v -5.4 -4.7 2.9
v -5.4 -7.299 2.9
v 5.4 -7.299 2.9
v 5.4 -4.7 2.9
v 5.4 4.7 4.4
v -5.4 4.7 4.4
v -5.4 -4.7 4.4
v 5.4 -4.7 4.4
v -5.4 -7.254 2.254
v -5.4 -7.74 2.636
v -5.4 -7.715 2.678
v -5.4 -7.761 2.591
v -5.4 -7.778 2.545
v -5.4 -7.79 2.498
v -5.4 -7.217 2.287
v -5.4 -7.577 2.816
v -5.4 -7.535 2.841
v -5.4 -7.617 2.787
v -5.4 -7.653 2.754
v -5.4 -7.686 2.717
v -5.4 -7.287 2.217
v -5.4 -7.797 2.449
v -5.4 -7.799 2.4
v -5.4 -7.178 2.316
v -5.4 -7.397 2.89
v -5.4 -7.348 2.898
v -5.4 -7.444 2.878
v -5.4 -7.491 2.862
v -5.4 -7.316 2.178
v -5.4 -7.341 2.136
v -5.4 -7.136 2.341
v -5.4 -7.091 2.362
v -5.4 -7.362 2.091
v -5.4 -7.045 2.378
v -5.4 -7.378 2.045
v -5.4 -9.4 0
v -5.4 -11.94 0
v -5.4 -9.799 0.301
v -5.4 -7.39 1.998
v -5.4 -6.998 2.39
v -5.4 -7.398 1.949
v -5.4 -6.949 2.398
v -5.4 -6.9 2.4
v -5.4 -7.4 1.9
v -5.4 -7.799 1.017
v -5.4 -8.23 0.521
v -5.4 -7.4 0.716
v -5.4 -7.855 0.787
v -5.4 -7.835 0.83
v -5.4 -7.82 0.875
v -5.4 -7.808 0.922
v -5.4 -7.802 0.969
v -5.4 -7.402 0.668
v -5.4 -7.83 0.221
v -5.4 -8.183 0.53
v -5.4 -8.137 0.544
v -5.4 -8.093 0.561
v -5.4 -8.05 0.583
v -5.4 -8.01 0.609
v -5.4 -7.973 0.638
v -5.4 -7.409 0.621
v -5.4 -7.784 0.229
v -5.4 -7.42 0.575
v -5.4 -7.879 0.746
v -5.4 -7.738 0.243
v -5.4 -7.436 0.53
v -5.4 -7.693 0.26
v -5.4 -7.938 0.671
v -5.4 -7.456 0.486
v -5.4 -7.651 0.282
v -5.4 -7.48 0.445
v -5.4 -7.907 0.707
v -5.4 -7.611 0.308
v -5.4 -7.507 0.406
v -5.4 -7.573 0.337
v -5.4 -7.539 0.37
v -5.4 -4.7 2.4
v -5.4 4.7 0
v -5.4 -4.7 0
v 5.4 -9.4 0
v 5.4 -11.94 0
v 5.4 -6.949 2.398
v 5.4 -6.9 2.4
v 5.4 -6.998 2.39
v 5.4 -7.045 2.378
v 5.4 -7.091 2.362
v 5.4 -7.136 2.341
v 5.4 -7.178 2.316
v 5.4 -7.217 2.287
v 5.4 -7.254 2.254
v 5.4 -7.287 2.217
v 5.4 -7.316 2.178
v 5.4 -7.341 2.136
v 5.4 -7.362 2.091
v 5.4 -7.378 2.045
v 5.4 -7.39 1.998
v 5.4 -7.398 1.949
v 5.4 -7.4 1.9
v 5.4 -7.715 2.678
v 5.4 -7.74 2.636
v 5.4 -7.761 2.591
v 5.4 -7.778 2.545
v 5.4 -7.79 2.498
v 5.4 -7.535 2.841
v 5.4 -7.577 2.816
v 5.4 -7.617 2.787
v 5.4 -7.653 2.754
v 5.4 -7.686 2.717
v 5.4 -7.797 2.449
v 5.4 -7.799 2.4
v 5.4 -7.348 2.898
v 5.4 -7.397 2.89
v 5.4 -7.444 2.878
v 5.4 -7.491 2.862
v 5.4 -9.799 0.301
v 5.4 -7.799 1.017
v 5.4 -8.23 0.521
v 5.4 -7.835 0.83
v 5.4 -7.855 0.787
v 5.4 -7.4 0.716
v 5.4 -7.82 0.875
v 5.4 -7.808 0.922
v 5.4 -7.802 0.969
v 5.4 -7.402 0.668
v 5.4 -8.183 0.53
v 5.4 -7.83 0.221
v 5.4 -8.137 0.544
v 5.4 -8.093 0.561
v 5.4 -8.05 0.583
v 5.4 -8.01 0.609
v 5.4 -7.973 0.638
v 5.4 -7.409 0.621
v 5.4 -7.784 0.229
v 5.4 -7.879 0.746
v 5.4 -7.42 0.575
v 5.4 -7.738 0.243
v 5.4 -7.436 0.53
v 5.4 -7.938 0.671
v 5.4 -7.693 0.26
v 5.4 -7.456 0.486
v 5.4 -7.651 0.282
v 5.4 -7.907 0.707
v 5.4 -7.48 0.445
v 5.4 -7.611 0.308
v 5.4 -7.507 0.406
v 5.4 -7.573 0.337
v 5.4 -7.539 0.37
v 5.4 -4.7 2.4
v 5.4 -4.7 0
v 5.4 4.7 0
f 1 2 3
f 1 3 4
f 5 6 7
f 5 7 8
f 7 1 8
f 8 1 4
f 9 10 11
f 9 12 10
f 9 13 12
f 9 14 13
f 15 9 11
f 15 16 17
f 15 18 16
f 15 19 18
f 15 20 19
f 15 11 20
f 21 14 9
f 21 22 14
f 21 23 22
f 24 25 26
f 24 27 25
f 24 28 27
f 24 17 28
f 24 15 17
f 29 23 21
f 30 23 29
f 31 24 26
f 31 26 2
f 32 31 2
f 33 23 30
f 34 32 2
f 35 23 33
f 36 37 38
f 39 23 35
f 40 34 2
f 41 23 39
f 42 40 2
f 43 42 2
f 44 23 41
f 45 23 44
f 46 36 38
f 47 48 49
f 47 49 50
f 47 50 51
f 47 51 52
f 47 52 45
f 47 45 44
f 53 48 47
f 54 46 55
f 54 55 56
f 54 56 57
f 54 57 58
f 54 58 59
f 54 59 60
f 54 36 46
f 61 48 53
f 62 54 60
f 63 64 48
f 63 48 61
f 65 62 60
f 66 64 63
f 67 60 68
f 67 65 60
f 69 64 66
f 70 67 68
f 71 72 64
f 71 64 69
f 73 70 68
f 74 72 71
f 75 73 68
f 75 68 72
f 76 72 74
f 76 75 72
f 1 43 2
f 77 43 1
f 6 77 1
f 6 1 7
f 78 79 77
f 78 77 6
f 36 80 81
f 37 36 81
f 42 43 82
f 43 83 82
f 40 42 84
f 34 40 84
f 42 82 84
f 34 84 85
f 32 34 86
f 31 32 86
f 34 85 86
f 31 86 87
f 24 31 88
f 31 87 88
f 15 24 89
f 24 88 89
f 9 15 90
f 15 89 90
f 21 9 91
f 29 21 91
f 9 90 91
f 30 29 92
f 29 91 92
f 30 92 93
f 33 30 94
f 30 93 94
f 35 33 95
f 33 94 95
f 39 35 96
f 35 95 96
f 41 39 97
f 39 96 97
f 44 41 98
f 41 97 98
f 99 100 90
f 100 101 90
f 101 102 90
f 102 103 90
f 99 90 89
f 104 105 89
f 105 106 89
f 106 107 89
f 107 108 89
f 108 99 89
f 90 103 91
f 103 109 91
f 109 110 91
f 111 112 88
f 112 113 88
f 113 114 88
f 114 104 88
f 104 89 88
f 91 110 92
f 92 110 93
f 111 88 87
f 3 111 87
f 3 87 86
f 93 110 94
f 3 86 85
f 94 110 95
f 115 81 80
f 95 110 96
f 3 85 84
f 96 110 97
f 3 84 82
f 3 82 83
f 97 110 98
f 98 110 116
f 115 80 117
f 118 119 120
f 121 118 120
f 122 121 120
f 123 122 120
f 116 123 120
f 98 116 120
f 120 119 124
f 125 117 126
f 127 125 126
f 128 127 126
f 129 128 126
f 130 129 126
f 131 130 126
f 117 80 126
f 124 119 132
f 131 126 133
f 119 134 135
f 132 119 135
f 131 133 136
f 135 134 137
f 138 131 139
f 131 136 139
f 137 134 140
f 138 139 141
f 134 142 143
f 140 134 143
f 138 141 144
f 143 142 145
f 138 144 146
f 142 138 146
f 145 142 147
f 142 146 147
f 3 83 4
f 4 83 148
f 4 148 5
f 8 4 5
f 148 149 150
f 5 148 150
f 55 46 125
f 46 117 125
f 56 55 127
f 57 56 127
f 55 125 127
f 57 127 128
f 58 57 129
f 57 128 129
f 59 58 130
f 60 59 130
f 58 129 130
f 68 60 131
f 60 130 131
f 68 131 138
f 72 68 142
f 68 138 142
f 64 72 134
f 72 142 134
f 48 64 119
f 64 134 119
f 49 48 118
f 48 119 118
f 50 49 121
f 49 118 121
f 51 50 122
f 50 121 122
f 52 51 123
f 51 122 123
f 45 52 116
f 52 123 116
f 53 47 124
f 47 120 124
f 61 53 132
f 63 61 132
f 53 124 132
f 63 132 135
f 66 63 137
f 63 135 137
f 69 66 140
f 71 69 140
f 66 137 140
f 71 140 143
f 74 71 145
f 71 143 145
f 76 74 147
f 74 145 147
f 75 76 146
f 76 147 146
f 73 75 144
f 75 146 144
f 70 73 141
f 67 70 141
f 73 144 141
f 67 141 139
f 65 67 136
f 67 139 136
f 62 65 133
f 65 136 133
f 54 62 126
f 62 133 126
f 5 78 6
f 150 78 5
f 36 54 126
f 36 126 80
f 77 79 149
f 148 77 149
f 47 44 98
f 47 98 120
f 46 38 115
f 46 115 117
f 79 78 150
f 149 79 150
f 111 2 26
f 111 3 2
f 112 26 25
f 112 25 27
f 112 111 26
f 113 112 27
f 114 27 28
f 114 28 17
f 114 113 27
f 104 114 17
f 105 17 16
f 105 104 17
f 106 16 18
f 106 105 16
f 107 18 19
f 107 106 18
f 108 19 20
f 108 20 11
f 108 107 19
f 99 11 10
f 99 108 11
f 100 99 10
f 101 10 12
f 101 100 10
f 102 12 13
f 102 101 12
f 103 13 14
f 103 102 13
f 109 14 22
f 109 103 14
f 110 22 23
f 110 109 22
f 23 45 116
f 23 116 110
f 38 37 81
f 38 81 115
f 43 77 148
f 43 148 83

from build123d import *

# Parameters (mm, degrees)
F0_W     = 10.8
F0_H     = 9.4
F1_DEPTH = 4.4
F3_DEPTH = 10.8
F4_R     = 0.5


with BuildPart() as f1:
    # F0 (on Top) → F1 (new body)
    with BuildSketch(Plane.XY):
        Rectangle(F0_W, F0_H)
    extrude(amount=F1_DEPTH)

    # F2 (on face) → F3 (join, through all)
    with BuildSketch(Plane(origin=(-5.4, 0, 0), x_dir=(0, -1, 0), z_dir=(-1, 0, 0))):
        Polygon((7.799318, 2.9), (4.7, 2.9), (4.7, 2.4), (7.4, 2.4), (7.799318, 2.4), align=None)
        Polygon((7.799318, 0.581989), (7.799318, 2.4), (7.4, 2.4), (7.4, 0.281082), align=None)
        Polygon((9.799318, 0.300908), (7.799318, 0.581989), (7.4, 0.281082), (9.4, 0), align=None)
        Polygon((11.940386, 0), (9.799318, 0.300908), (9.4, 0), align=None)
    extrude(amount=-F3_DEPTH)

    # F4
    f4_edges = [f1.edges().sort_by_distance(p)[0] for p in [
        (0, -7.799318, 2.9),
        (0, -7.4, 2.4),
        (0, -7.4, 0.281082),
        (0, -7.799318, 0.581989),
    ]]
    fillet(f4_edges, radius=F4_R)


solid = f1.part
